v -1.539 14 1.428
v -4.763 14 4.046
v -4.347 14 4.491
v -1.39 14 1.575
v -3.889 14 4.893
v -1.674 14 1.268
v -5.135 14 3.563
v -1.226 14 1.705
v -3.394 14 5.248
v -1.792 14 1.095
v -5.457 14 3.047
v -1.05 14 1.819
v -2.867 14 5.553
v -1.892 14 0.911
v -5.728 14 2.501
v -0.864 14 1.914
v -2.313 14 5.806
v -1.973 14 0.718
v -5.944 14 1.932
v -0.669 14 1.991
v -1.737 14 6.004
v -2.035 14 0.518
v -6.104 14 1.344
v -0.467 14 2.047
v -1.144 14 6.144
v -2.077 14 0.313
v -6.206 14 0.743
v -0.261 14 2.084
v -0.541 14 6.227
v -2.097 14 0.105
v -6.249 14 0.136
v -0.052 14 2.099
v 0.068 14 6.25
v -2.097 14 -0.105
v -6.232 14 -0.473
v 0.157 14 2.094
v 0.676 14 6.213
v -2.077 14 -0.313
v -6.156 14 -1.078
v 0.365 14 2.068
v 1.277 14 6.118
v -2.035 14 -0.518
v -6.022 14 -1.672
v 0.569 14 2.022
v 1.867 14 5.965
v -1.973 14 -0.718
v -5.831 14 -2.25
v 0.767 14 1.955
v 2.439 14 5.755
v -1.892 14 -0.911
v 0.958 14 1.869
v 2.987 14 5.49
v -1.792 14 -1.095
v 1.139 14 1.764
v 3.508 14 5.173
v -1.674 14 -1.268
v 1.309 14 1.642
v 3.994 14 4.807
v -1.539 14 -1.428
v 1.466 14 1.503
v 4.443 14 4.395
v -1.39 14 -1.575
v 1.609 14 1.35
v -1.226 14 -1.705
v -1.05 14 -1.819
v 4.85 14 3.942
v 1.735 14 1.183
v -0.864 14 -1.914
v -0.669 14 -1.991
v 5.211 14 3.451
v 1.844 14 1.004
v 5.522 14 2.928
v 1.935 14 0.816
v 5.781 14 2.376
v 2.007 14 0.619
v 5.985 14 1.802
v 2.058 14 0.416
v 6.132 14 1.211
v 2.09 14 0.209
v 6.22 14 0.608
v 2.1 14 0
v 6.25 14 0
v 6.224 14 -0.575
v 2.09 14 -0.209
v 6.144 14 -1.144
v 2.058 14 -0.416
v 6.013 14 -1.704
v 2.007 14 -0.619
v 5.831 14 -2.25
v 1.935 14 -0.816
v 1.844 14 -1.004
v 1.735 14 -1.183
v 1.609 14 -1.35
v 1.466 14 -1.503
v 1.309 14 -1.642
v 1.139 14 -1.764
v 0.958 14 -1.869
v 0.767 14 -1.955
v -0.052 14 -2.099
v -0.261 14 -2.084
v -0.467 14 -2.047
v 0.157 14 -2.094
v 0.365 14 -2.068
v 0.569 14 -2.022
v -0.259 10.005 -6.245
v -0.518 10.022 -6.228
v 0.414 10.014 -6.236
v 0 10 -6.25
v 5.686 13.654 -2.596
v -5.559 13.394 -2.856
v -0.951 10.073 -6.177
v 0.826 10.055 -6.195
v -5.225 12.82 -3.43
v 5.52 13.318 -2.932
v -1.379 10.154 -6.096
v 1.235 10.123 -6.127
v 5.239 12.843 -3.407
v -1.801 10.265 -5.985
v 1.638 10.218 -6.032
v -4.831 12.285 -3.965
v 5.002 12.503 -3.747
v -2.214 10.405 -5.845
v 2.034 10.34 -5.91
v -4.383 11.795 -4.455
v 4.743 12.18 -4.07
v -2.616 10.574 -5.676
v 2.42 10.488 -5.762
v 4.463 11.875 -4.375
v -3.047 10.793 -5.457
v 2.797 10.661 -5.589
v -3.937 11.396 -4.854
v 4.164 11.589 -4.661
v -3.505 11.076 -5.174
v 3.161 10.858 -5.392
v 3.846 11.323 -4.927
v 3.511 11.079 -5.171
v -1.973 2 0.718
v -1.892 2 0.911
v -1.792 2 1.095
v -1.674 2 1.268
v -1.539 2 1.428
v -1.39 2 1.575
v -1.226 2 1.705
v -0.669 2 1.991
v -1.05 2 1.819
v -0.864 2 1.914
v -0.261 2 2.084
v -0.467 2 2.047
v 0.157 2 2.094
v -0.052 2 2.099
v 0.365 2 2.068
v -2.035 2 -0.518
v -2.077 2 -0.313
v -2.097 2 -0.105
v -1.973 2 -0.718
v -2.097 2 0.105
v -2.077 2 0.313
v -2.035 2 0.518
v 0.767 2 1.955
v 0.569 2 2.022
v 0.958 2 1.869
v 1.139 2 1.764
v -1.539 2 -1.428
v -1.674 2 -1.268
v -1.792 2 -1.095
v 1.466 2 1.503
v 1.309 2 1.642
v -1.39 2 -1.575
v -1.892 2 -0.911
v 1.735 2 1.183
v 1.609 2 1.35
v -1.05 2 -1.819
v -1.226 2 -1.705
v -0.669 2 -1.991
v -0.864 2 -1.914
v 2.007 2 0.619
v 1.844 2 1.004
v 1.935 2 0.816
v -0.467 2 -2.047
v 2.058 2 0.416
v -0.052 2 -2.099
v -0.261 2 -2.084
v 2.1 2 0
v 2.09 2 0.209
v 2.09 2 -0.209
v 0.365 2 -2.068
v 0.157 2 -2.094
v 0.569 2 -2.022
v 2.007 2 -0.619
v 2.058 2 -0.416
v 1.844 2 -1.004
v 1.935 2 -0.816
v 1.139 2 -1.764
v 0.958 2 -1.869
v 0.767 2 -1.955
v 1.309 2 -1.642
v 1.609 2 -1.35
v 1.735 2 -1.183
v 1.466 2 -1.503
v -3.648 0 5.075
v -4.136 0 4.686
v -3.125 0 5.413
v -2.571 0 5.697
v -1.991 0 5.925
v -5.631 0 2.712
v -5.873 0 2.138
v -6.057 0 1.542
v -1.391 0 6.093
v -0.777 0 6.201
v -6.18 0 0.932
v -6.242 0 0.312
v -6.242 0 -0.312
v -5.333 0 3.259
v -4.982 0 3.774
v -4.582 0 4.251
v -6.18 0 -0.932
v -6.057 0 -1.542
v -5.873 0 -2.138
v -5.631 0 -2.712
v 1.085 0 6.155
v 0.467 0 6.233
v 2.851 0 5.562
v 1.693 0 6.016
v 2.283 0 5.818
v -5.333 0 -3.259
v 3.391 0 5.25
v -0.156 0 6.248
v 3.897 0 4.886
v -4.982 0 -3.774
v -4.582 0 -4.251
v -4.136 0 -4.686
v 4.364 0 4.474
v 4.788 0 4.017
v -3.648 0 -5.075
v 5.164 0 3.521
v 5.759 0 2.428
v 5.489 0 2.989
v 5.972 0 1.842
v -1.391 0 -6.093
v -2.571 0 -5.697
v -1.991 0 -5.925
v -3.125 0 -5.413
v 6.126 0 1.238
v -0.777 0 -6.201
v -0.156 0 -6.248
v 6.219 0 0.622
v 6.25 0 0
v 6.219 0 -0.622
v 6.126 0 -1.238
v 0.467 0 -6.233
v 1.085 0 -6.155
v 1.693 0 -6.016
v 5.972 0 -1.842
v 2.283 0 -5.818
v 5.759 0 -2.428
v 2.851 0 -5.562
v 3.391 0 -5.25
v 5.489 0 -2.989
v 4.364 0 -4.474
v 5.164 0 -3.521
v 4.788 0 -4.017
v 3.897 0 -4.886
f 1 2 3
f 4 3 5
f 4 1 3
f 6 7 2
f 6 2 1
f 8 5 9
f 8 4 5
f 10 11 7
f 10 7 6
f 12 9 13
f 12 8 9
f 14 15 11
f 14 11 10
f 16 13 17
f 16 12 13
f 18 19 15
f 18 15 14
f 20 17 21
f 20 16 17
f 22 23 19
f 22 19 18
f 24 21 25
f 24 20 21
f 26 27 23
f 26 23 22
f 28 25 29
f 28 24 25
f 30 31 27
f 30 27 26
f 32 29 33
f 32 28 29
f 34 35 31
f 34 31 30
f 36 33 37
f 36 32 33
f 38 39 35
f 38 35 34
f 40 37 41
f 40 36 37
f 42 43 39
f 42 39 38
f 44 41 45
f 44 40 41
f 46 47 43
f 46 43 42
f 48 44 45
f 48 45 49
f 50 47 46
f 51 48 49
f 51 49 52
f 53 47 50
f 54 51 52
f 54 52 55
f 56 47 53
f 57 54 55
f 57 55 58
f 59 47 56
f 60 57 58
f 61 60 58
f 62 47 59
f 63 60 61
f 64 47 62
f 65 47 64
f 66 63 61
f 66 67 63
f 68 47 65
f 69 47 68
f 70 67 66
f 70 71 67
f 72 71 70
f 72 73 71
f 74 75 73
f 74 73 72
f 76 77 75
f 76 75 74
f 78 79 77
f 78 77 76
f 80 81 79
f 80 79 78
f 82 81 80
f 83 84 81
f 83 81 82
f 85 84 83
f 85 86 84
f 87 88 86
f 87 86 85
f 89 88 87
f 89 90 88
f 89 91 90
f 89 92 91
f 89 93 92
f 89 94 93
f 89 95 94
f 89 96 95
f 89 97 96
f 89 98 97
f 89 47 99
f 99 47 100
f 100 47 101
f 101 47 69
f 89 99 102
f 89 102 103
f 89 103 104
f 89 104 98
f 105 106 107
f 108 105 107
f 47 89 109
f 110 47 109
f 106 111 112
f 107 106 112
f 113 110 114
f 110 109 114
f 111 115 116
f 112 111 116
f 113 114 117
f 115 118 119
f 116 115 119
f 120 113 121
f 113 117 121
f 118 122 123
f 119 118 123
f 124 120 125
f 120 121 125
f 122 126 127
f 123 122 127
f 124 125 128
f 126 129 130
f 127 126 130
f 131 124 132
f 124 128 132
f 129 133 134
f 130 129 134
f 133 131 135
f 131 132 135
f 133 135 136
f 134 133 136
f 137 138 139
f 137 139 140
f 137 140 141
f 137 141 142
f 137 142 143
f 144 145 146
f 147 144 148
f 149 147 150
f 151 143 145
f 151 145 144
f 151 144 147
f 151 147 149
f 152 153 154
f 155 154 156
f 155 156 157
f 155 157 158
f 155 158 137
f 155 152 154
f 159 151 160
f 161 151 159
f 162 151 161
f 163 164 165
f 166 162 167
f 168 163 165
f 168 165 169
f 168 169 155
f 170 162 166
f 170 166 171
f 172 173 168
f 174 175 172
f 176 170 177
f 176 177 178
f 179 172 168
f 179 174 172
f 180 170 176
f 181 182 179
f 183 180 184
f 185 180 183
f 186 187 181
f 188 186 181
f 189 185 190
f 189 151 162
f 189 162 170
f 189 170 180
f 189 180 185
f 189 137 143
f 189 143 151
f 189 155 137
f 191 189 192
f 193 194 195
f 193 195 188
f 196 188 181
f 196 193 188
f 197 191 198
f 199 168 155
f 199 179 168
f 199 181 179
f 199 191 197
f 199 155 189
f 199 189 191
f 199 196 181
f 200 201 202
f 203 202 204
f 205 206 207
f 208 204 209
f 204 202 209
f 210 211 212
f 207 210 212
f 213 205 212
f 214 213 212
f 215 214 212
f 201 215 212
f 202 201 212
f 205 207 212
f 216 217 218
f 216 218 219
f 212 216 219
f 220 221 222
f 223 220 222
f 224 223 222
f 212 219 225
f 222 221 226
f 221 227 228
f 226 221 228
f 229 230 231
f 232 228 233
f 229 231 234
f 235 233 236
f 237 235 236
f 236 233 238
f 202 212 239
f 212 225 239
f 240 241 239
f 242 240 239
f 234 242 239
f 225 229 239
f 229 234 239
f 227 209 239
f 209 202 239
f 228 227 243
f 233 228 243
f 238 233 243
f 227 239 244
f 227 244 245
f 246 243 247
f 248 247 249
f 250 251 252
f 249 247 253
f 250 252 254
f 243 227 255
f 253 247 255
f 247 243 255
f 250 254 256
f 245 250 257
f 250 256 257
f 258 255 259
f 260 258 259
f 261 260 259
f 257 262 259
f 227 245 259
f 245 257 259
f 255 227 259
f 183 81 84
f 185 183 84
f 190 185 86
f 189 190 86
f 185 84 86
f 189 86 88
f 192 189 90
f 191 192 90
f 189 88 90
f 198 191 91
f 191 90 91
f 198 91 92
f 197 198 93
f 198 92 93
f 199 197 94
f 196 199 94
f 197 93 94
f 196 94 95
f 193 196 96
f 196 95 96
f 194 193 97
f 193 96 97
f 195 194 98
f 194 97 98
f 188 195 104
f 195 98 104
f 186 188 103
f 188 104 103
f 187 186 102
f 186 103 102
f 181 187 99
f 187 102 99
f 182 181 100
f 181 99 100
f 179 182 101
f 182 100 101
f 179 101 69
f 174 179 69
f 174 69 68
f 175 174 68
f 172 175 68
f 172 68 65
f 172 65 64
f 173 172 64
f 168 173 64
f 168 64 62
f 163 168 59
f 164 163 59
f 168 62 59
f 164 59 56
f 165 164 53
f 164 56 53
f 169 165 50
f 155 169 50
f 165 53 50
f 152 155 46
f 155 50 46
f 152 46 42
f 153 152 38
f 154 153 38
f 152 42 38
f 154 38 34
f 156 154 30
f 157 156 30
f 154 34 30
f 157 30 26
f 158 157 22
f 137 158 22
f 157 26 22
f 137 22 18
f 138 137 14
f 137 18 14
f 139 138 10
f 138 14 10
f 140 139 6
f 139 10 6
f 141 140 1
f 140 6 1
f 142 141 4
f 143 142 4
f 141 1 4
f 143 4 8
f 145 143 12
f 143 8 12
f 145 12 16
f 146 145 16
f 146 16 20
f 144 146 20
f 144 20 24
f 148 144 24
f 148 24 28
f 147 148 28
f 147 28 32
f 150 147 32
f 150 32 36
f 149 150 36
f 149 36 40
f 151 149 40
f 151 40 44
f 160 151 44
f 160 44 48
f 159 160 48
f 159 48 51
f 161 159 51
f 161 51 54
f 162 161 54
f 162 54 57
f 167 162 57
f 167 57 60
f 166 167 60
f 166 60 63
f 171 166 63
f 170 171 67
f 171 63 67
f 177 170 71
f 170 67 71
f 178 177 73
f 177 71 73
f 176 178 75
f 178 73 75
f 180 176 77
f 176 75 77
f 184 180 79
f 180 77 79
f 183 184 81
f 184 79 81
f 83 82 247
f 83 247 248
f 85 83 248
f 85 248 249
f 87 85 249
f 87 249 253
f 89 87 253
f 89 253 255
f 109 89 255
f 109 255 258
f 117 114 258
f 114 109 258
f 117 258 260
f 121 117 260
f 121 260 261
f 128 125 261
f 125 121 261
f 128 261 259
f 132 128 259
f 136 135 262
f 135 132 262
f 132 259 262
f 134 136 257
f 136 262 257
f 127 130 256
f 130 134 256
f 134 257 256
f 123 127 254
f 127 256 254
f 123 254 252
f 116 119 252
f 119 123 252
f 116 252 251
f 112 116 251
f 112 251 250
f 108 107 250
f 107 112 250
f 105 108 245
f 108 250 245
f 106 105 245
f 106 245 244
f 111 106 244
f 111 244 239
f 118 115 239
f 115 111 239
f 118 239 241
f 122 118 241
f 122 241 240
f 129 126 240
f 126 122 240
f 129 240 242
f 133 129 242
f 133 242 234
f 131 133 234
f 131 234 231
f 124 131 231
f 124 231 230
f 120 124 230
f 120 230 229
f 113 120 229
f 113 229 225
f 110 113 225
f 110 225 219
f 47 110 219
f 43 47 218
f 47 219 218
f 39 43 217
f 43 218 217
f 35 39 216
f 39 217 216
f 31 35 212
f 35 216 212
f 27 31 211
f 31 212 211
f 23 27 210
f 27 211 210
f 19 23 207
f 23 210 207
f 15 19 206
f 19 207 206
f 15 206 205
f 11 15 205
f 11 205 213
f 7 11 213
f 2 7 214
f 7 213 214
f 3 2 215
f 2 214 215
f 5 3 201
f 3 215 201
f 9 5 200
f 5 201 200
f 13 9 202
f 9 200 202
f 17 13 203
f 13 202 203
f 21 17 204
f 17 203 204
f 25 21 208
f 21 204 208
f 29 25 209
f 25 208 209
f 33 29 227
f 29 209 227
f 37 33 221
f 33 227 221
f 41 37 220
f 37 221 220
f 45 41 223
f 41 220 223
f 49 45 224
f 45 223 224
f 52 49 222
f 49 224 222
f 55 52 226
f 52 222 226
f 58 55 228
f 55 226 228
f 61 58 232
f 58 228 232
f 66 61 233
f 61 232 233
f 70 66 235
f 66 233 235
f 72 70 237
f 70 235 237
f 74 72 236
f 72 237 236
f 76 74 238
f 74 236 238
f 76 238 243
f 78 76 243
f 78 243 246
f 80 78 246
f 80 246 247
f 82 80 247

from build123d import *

# Parameters (mm, degrees)
SKETCH1_R           = 6.25
BOSS_EXTRUDE1_DEPTH = 14
SKETCH2_R           = 2.1
CUT_EXTRUDE1_DEPTH  = 12
CUT_EXTRUDE2_DEPTH  = 7


with BuildPart() as part:
    # Sketch1 → Boss-Extrude1 (new body)
    with BuildSketch(Plane(origin=(0, 0, 0), x_dir=(1, 0, 0), z_dir=(0, 1, 0))):
        Circle(SKETCH1_R)
    extrude(amount=BOSS_EXTRUDE1_DEPTH)

    # Sketch2 → Cut-Extrude1 (cut)
    with BuildSketch(Plane(origin=(0, 14, 0), x_dir=(1, 0, 0), z_dir=(0, 1, 0))):
        Circle(SKETCH2_R)
    extrude(amount=-CUT_EXTRUDE1_DEPTH, mode=Mode.SUBTRACT)

    # Sketch3 → Cut-Extrude2 (cut, symmetric)
    with BuildSketch(Plane(origin=(0, 0, 0), x_dir=(0, 0, -1), z_dir=(1, 0, 0))):
        Polygon((2.25, 14), (6.25, 10), (6.25, 14), align=None)
    extrude(amount=CUT_EXTRUDE2_DEPTH, both=True, mode=Mode.SUBTRACT)


solid = part.part
